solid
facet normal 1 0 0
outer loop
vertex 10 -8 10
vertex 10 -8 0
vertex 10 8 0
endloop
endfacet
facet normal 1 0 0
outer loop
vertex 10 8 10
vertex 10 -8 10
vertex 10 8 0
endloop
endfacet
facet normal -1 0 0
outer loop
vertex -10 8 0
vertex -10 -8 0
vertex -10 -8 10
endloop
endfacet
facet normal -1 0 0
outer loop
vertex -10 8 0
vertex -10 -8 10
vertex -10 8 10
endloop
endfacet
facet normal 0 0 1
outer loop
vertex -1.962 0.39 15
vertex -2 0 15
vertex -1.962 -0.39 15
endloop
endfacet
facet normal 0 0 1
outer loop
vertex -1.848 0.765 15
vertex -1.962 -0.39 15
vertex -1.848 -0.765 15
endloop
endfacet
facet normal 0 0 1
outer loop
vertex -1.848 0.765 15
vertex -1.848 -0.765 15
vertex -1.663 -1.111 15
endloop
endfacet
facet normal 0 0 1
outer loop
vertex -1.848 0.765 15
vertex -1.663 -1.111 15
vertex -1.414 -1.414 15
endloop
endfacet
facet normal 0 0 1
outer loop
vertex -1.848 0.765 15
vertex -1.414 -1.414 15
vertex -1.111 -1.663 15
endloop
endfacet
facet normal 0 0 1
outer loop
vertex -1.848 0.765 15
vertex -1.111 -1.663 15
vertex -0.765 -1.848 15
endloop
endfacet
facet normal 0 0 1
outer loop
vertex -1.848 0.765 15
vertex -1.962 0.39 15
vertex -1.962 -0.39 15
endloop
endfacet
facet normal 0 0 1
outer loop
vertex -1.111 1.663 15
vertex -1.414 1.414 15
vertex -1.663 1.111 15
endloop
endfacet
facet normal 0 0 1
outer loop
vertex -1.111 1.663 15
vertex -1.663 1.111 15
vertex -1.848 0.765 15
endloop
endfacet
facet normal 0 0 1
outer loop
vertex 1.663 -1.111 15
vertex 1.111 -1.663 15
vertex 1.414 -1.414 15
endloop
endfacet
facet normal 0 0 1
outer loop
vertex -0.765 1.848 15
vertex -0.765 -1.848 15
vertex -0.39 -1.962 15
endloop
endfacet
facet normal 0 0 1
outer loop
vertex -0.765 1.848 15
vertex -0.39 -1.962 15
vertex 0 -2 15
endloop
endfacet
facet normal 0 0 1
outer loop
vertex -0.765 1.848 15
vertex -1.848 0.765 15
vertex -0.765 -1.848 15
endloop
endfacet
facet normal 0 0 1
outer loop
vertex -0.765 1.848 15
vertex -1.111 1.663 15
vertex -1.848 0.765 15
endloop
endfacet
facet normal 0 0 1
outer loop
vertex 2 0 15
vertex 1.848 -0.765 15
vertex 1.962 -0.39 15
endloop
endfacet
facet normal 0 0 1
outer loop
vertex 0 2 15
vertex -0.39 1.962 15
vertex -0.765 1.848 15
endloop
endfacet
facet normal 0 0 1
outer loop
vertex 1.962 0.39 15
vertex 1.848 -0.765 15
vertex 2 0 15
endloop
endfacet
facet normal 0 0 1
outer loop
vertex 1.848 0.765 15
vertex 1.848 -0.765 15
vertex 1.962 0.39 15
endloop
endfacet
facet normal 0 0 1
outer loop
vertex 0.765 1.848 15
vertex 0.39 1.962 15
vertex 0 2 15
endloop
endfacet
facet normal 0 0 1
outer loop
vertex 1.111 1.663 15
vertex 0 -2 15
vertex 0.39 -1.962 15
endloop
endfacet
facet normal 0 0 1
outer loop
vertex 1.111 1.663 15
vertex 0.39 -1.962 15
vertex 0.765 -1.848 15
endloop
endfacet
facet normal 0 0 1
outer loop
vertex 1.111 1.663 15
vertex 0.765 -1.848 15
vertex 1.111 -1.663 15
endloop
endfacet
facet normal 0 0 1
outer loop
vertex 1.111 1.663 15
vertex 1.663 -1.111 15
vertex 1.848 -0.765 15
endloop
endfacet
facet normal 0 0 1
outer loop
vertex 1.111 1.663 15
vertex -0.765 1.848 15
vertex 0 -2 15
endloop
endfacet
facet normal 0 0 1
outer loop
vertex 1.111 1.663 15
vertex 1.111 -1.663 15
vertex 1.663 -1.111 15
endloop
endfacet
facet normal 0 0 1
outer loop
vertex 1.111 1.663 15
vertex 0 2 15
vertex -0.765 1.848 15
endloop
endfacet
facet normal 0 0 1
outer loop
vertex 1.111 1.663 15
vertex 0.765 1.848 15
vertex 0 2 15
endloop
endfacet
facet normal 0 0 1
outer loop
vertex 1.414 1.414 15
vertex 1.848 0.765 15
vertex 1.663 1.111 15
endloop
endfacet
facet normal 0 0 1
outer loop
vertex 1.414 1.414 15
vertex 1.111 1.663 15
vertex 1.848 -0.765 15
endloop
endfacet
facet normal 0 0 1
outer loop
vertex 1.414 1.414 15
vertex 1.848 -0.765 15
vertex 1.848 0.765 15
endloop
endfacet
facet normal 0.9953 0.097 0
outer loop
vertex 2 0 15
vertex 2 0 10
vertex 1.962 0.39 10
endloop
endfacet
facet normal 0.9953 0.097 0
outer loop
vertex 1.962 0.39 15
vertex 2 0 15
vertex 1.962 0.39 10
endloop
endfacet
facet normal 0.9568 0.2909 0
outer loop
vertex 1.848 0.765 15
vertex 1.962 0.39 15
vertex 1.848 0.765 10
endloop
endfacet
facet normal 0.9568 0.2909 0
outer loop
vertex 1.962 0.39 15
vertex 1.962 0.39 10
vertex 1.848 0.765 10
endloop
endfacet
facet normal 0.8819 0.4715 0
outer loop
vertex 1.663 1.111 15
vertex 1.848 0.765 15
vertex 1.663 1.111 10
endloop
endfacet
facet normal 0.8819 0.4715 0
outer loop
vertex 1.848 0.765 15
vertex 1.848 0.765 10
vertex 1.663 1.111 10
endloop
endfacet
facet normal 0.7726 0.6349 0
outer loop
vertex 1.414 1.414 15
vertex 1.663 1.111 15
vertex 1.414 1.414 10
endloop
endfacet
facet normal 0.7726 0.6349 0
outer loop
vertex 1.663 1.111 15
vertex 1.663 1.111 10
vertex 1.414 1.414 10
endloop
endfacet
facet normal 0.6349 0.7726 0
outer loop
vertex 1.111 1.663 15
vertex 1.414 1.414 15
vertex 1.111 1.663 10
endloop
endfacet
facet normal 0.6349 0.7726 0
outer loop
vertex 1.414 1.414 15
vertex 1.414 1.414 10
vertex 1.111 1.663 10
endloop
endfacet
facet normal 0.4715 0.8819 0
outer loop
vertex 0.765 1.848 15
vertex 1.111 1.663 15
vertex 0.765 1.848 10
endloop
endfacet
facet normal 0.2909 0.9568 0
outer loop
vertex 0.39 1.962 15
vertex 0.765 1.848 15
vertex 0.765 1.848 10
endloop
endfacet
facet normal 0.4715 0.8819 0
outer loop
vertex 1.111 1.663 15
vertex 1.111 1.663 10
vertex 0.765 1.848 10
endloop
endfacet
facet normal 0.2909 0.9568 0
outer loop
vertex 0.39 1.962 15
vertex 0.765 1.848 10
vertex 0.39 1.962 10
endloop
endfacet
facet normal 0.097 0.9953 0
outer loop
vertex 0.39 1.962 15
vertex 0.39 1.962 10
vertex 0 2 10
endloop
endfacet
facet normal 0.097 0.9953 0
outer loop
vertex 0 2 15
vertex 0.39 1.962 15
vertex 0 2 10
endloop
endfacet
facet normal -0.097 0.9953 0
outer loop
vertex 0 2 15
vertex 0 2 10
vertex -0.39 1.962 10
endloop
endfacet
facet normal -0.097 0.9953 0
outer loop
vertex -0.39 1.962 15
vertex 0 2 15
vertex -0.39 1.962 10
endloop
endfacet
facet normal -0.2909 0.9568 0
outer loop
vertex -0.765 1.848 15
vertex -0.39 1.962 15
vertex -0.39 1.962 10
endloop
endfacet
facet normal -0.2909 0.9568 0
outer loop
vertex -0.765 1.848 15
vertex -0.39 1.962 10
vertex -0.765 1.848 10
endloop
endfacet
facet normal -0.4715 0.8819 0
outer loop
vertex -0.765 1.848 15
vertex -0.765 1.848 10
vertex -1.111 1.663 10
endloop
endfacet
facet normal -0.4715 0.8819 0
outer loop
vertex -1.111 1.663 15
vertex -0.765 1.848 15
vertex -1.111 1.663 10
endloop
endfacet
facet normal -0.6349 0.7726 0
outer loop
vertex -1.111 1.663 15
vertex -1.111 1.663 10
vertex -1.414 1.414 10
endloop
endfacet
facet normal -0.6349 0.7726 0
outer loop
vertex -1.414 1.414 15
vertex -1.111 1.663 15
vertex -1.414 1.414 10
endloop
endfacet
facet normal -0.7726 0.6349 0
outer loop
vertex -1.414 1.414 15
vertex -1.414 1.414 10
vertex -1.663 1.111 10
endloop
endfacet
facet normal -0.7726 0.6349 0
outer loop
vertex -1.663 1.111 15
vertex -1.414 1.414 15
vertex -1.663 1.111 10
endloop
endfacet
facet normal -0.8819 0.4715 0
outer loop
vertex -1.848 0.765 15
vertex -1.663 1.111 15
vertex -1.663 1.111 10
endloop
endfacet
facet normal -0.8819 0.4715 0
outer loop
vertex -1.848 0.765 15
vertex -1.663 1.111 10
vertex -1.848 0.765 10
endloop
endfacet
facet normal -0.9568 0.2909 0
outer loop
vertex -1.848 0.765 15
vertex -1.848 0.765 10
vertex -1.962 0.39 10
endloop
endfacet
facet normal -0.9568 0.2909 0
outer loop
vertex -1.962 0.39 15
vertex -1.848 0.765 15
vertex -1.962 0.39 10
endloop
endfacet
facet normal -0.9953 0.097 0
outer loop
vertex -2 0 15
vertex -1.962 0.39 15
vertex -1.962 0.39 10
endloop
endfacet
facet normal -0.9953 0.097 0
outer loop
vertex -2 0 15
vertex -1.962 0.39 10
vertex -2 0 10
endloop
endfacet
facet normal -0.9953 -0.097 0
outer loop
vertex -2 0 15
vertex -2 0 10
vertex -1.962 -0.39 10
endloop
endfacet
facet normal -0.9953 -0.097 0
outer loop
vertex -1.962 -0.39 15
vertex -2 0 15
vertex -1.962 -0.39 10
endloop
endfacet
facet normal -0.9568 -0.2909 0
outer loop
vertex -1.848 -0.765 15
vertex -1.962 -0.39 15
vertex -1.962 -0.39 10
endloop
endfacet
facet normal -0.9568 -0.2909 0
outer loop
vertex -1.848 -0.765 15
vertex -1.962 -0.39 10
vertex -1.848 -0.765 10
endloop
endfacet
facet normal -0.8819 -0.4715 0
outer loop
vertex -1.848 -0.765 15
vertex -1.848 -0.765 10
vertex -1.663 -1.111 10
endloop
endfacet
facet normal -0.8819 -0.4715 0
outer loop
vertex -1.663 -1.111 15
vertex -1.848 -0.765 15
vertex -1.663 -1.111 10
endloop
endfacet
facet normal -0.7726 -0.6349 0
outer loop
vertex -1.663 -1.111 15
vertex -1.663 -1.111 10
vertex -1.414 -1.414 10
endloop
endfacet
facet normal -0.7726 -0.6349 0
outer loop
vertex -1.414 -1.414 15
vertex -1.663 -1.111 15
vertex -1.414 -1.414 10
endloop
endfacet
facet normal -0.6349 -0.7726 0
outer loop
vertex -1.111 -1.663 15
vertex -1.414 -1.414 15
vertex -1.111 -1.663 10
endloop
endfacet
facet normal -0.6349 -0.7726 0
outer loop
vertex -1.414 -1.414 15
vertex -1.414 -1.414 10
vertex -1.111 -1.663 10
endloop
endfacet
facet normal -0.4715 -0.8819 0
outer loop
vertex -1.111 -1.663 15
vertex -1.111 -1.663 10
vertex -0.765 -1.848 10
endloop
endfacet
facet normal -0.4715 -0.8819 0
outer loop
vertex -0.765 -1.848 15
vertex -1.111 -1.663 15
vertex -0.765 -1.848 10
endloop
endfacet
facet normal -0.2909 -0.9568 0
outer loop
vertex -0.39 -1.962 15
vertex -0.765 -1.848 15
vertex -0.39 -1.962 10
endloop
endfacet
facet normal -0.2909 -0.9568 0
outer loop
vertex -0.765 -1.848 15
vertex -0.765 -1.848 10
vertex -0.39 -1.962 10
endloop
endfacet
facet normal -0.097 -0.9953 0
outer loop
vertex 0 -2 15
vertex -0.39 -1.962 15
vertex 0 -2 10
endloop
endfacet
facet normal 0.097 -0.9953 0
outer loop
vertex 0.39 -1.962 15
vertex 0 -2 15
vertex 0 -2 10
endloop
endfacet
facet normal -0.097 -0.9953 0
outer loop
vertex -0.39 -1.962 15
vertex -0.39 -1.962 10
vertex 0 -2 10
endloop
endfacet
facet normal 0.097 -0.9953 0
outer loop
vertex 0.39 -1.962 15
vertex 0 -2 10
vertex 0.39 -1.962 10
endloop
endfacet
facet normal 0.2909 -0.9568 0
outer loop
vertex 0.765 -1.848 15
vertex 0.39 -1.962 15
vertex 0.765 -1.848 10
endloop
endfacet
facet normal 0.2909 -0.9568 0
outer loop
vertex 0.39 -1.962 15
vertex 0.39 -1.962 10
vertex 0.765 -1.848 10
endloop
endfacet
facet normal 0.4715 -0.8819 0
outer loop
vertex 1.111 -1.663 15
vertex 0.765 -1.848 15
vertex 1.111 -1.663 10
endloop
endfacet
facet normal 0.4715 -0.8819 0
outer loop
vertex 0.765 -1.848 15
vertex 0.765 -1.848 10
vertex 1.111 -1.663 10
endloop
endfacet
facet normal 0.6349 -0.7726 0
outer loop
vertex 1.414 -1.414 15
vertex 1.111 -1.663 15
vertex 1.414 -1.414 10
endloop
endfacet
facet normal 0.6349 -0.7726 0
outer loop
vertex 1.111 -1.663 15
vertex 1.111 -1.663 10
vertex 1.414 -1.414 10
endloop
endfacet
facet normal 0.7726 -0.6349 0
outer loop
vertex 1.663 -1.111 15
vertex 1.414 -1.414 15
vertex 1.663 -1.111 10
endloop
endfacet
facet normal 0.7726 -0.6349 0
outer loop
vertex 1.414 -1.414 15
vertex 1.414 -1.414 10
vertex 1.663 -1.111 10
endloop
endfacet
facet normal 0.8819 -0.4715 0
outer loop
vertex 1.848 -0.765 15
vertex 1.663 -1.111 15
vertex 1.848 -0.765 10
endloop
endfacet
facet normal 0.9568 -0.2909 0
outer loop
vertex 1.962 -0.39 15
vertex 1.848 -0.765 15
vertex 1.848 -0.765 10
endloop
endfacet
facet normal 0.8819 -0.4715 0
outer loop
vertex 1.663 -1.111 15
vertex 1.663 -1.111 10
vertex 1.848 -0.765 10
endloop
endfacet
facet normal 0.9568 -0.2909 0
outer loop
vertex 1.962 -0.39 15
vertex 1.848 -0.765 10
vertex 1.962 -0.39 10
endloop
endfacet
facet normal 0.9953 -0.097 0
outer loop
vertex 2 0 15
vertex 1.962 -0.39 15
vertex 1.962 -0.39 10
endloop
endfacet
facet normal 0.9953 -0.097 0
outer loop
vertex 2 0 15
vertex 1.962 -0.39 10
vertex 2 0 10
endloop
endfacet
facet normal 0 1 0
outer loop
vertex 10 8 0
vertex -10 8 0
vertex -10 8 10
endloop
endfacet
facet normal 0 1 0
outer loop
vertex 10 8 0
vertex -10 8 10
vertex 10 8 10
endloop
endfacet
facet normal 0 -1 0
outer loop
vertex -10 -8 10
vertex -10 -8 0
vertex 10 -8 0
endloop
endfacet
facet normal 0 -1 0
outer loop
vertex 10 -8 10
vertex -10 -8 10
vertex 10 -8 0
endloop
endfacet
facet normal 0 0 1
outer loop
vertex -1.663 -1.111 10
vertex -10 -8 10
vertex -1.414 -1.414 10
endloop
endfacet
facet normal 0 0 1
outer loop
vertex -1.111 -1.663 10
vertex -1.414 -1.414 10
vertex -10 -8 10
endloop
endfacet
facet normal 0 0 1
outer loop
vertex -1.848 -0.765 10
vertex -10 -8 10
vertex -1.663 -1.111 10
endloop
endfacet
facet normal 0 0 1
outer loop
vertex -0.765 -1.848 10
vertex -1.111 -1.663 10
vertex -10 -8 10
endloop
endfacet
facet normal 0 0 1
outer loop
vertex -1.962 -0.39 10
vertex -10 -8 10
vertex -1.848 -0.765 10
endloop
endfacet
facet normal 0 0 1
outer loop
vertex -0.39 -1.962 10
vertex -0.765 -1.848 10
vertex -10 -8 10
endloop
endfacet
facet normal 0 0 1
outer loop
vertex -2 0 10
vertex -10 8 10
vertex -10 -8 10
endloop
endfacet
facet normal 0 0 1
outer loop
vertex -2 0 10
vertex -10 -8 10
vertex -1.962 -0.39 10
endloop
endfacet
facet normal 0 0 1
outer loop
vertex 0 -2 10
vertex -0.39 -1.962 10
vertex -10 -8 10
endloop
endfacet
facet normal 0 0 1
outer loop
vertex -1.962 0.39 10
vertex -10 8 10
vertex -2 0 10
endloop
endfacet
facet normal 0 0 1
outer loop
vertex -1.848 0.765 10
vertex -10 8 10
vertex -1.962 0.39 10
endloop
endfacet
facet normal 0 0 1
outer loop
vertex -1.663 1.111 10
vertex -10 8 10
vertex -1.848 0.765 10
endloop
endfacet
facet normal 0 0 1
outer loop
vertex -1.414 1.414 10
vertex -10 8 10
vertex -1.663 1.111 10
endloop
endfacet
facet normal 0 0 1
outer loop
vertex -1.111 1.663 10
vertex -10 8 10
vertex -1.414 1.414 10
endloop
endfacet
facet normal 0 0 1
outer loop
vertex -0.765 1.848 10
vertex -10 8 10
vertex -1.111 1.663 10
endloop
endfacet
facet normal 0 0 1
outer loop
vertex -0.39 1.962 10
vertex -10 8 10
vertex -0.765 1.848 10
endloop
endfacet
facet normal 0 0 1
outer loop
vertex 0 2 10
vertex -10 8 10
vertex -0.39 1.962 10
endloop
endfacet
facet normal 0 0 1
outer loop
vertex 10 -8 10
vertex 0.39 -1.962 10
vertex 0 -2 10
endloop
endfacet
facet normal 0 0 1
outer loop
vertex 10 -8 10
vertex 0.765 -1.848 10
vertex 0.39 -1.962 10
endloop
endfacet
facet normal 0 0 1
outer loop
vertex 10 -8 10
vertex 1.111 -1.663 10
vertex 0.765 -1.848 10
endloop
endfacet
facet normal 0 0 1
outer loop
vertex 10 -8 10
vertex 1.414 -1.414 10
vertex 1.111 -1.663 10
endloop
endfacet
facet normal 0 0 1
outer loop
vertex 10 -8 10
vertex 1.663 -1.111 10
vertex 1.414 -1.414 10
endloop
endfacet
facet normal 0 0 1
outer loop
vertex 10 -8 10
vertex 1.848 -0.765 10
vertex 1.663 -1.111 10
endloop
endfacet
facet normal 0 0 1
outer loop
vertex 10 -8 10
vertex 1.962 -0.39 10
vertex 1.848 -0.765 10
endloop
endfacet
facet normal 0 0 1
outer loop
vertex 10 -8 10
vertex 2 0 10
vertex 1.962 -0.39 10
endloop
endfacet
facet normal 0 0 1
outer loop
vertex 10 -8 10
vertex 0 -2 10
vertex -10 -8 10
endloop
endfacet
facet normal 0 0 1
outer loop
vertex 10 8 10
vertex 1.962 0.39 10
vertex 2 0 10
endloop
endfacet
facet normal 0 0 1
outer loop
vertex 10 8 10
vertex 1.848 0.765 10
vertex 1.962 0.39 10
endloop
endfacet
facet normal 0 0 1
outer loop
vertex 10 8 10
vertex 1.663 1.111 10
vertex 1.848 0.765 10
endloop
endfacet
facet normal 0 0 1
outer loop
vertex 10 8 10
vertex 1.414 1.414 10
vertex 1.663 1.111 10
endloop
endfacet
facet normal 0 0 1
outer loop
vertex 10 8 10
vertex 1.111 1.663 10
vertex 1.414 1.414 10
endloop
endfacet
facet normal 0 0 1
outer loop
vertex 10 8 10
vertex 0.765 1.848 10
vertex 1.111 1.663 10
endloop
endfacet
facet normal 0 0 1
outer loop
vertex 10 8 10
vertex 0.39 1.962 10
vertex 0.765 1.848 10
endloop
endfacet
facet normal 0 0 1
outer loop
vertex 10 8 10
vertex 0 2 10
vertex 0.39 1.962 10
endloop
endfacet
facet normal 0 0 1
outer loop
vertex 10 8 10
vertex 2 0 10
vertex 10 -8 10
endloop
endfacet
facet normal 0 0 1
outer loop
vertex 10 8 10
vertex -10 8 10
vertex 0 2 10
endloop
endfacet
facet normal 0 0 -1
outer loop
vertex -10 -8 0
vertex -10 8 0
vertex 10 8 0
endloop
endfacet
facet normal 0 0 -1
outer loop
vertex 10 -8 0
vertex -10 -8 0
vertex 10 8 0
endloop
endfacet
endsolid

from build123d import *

# Parameters (mm, degrees)
SKETCH1_W           = 20
SKETCH1_H           = 16
SKETCH1_R           = 2
BOSS_EXTRUDE1_DEPTH = 10
SKETCH1_3_R         = 2
BOSS_EXTRUDE2_DEPTH = 15


with BuildPart() as part:
    # Sketch1 → Boss-Extrude1 (new body)
    with BuildSketch(Plane.XY):
        Rectangle(SKETCH1_W, SKETCH1_H)
        Circle(SKETCH1_R, mode=Mode.SUBTRACT)
    extrude(amount=BOSS_EXTRUDE1_DEPTH)

    # Sketch1_3 → Boss-Extrude2 (add)
    with BuildSketch(Plane.XY):
        Circle(SKETCH1_3_R)
    extrude(amount=BOSS_EXTRUDE2_DEPTH)


solid = part.part
